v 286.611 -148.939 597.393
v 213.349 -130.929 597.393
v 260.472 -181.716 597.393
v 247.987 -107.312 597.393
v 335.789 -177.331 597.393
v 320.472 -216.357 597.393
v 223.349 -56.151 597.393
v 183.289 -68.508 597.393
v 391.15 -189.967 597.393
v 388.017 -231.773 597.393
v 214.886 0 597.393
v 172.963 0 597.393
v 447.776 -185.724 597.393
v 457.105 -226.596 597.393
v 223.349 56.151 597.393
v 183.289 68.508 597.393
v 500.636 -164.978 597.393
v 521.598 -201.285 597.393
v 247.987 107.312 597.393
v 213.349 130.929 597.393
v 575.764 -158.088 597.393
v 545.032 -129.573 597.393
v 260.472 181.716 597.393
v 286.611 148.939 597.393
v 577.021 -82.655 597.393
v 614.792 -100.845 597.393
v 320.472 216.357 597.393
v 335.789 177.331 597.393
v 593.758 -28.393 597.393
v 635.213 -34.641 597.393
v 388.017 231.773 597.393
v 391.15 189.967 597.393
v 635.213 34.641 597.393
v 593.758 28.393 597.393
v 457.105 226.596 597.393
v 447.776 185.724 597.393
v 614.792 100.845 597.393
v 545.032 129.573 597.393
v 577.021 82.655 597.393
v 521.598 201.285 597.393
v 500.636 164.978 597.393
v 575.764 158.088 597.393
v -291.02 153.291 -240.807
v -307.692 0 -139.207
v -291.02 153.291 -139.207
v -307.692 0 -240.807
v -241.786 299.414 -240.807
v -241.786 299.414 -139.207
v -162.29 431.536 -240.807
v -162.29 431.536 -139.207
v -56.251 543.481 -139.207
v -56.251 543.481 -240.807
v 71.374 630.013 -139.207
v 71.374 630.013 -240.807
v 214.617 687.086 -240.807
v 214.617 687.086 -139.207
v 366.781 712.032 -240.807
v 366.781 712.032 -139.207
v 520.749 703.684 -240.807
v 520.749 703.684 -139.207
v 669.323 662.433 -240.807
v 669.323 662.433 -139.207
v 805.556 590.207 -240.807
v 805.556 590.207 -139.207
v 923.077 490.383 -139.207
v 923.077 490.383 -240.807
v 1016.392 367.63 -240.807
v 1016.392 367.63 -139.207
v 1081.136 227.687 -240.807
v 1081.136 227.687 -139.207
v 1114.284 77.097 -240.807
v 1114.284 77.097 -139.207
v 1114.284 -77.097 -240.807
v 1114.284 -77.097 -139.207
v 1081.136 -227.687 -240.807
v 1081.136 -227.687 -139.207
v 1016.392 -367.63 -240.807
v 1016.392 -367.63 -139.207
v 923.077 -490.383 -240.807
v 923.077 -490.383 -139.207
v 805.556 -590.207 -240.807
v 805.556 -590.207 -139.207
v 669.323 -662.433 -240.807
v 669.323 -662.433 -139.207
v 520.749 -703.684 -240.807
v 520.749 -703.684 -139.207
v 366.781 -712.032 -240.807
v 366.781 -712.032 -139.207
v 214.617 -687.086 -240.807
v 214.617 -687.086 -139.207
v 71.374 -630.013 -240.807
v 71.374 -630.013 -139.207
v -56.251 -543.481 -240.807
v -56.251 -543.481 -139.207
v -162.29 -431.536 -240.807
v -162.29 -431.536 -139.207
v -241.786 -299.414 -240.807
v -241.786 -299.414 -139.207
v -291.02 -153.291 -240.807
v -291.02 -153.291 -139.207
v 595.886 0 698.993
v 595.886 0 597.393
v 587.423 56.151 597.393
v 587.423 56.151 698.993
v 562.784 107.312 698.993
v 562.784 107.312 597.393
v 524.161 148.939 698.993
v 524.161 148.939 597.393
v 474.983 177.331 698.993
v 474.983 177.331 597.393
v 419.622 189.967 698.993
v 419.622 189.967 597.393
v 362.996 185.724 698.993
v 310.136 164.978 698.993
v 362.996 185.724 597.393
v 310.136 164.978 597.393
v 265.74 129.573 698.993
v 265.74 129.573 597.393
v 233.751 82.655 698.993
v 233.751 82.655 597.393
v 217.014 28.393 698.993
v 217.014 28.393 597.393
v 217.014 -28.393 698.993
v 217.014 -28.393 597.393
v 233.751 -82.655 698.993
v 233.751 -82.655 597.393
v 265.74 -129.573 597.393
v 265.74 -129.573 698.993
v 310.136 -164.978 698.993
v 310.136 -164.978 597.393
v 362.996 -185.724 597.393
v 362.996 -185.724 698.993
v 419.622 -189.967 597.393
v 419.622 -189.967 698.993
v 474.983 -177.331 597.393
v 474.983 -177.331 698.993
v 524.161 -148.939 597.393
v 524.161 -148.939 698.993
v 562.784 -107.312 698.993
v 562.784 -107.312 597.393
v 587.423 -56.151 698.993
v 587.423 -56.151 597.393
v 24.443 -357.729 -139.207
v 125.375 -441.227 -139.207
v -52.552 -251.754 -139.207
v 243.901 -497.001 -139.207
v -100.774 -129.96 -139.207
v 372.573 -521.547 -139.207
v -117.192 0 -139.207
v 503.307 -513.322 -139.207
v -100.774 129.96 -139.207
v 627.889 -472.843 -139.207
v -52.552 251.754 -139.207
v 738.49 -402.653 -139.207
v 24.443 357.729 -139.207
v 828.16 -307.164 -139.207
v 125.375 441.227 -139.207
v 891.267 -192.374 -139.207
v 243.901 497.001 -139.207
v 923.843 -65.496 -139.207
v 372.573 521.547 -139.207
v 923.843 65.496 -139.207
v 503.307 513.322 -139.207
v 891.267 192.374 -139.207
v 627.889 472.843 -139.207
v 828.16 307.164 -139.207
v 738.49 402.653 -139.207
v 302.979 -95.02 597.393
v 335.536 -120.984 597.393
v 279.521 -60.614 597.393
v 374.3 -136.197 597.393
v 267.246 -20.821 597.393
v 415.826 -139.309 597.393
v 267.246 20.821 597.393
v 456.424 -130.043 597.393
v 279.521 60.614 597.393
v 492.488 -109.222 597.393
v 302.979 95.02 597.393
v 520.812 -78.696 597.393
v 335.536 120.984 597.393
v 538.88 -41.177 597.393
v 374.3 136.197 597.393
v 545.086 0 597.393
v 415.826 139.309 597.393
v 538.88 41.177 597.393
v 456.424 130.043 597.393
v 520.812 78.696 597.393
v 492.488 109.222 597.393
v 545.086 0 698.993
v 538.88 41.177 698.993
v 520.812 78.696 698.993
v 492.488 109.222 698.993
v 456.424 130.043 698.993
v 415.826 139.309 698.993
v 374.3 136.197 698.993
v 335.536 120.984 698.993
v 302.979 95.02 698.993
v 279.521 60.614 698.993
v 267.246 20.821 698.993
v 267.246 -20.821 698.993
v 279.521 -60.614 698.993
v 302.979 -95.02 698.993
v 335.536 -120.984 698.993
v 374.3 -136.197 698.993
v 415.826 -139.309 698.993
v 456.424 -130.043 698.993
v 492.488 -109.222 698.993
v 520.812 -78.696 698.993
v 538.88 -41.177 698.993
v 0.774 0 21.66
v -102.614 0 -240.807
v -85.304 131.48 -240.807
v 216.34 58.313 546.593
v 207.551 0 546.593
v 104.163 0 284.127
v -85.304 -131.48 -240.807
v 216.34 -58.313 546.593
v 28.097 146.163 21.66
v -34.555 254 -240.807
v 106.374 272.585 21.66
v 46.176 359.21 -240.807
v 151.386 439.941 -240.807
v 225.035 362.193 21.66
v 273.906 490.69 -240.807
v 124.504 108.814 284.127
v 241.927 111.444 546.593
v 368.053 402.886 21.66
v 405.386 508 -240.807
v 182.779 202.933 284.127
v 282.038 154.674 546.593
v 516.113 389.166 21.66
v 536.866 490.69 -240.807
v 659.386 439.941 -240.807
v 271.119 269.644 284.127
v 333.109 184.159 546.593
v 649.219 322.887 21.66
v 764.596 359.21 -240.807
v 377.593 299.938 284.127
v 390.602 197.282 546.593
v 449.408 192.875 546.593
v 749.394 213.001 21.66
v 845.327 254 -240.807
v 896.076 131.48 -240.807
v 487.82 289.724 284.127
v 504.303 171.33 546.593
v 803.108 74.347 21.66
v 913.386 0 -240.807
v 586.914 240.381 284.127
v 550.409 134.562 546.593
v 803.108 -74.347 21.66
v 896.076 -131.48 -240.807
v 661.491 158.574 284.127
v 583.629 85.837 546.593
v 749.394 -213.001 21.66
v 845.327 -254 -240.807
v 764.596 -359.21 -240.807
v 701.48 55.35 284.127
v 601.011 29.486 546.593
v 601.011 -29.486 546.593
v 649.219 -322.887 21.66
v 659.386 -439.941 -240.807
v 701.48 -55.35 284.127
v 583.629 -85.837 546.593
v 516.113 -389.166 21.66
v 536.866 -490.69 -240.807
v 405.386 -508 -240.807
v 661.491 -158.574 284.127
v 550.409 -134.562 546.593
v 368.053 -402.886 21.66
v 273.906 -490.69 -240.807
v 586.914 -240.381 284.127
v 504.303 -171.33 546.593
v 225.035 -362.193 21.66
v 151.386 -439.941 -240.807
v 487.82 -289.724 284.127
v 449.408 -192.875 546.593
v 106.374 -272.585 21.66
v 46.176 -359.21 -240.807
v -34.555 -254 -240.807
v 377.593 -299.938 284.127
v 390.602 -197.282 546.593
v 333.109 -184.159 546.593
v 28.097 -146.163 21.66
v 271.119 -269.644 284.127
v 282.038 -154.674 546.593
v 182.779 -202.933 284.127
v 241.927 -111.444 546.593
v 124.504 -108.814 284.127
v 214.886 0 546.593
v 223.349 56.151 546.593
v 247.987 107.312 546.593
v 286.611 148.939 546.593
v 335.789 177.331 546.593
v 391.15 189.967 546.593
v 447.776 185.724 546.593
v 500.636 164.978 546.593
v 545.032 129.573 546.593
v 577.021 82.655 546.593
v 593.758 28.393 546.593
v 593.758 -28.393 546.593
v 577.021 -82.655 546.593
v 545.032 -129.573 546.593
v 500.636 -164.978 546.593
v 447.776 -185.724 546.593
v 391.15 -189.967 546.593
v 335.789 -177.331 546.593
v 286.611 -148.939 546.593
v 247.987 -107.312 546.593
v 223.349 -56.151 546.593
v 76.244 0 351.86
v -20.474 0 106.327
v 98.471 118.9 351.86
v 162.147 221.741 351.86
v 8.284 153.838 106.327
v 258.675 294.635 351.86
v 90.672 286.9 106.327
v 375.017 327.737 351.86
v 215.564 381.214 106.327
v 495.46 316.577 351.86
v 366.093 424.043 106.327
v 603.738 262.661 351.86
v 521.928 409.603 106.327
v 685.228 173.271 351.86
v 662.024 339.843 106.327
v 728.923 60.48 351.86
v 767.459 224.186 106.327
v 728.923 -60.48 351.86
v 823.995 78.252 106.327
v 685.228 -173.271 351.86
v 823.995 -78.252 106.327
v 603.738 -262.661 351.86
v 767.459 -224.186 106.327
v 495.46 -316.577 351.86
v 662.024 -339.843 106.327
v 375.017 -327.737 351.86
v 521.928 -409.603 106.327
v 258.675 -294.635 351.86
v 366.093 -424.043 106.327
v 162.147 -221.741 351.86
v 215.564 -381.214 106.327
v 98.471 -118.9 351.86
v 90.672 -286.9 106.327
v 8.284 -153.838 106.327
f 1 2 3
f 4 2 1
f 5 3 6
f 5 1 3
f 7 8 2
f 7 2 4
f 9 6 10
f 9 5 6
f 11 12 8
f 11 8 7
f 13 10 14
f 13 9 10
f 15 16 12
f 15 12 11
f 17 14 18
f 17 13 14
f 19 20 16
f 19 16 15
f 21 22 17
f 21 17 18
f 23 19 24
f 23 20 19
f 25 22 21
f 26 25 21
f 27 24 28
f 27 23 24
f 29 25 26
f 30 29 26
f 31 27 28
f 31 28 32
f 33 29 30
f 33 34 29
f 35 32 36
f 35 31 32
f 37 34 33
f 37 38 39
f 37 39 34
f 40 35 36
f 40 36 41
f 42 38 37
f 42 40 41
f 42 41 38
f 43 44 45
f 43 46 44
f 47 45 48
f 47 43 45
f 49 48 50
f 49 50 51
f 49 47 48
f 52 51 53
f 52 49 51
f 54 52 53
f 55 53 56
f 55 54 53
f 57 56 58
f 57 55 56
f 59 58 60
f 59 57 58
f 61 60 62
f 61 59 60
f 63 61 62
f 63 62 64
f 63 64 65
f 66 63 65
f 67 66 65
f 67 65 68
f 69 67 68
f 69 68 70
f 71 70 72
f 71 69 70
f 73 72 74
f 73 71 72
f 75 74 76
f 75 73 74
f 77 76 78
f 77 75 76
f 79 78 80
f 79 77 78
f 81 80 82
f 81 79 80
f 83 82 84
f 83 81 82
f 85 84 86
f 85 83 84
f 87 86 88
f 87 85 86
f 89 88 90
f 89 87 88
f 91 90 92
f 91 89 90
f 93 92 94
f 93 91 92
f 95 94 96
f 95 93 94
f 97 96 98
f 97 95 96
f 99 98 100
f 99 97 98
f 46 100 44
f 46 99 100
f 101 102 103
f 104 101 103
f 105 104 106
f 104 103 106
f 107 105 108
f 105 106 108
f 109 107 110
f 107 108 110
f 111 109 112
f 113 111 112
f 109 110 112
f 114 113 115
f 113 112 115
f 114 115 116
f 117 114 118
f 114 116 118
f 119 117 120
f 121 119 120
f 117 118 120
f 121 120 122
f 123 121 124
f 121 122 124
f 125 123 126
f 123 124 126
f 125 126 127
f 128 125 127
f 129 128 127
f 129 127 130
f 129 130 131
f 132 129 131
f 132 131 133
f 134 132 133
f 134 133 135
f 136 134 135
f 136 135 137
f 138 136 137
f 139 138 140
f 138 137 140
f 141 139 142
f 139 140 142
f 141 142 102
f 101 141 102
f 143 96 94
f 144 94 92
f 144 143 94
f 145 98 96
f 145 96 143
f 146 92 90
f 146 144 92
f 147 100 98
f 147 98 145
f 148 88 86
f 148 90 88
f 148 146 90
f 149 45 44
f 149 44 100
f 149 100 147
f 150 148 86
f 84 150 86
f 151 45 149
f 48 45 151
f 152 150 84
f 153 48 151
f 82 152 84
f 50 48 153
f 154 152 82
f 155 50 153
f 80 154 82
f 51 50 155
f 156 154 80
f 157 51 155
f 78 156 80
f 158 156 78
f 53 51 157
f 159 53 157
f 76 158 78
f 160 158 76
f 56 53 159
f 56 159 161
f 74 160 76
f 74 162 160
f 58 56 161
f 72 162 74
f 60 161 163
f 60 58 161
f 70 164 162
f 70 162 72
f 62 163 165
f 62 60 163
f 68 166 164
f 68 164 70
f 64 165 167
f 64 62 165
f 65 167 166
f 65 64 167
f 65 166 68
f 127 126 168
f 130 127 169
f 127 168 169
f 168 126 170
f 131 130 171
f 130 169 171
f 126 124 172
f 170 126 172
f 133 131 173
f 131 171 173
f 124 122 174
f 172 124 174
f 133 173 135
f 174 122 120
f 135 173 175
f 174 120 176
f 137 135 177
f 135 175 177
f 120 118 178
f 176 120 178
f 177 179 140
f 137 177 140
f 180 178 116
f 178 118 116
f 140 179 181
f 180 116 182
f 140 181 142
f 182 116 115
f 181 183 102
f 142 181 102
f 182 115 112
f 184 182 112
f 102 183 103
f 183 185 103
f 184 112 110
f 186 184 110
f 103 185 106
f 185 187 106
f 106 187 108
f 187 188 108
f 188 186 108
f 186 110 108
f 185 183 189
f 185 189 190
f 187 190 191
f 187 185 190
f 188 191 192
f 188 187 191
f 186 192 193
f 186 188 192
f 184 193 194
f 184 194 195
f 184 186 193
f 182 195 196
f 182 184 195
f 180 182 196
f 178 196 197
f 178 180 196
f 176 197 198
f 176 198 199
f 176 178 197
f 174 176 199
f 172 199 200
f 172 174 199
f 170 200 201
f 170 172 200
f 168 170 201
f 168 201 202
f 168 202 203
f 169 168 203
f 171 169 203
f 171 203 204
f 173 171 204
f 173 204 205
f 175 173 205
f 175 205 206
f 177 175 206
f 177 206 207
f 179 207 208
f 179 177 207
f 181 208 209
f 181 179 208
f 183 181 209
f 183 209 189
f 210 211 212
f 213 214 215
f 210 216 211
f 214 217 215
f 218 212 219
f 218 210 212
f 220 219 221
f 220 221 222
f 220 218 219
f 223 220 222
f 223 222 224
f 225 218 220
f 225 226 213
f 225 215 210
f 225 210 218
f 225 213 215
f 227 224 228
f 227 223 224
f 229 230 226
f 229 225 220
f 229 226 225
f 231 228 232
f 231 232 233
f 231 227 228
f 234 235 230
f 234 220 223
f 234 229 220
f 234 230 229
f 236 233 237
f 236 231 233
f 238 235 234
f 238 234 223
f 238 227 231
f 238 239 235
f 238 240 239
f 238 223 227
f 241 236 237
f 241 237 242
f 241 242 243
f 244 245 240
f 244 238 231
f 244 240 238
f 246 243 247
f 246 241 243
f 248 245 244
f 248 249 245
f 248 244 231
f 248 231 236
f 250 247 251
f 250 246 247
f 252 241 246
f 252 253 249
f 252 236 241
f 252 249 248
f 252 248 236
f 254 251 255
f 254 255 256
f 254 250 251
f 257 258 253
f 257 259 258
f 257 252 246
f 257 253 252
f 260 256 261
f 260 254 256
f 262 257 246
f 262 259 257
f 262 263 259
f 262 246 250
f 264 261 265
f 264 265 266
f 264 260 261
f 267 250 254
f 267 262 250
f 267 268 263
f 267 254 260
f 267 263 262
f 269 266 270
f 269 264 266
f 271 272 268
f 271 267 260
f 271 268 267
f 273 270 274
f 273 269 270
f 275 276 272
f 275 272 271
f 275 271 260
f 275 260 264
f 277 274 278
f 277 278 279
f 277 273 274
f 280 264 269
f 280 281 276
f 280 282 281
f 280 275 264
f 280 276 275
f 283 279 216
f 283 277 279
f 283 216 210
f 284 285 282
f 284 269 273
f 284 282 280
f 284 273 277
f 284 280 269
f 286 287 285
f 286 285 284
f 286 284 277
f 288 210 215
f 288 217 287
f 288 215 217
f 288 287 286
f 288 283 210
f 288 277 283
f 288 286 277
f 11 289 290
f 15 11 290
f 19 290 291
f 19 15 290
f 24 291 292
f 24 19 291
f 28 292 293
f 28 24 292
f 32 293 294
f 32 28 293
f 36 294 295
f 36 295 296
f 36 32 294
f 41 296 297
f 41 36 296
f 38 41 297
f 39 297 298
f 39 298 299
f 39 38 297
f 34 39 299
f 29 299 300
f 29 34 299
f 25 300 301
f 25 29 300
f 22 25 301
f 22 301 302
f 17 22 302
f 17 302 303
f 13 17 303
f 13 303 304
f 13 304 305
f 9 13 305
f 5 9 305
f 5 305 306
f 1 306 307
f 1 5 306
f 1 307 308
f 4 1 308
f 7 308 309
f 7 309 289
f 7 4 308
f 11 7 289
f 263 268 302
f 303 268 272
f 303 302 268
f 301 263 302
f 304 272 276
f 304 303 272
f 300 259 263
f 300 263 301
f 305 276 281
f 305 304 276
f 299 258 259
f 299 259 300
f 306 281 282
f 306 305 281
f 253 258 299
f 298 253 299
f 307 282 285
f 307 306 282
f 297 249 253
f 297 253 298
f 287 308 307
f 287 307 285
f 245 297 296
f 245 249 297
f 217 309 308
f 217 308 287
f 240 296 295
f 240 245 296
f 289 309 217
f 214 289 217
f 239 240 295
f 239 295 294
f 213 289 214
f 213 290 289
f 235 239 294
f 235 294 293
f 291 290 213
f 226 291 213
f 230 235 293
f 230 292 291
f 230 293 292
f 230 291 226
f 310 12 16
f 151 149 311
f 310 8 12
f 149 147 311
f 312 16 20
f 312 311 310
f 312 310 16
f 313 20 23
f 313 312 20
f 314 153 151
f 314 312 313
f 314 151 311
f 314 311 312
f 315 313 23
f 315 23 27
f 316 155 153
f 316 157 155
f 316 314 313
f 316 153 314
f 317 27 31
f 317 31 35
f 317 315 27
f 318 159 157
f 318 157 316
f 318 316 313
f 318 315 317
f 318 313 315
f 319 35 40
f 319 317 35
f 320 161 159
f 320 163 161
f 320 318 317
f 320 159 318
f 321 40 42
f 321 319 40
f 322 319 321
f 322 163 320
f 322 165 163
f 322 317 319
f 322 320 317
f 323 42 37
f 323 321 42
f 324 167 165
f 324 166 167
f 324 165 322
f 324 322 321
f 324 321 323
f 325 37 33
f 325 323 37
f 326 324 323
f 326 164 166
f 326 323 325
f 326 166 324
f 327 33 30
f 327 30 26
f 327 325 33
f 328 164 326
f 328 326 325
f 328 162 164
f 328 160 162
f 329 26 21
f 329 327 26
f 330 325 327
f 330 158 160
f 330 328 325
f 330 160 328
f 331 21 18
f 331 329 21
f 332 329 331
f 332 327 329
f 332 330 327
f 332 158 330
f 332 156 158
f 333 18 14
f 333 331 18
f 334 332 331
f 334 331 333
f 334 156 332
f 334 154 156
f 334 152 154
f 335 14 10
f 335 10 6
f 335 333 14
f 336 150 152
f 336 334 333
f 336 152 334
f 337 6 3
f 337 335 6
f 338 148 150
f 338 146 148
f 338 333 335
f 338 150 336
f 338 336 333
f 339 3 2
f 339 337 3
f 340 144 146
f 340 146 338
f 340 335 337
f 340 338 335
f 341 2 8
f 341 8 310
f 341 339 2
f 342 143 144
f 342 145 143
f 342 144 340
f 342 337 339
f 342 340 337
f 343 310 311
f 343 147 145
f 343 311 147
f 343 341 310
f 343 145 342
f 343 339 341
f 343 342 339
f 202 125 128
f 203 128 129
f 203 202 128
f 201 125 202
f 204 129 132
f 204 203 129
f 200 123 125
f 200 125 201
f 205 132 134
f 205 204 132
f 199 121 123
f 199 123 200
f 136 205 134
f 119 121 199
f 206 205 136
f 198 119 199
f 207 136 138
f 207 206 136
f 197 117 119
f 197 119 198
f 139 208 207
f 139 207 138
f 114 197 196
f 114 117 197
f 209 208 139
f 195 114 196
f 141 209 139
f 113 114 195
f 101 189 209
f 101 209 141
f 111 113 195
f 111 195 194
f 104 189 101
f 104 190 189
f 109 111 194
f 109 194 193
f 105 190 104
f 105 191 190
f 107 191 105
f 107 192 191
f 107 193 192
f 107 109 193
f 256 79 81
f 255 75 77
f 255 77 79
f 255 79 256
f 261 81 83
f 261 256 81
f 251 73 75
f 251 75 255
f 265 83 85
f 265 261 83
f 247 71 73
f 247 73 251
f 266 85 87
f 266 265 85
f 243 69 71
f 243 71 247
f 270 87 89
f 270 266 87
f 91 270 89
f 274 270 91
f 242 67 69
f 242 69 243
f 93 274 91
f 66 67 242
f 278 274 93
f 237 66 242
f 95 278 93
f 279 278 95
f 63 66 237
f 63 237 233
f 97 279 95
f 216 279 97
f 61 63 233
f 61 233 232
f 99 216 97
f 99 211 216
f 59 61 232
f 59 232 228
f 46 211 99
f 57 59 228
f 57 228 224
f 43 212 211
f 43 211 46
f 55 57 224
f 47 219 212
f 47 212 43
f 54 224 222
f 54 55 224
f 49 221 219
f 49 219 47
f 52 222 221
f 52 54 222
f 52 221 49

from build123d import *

# Parameters (mm, degrees)
F2_R     = 190.5
F2_R_2   = 139.7
F3_DEPTH = 101.6


with BuildPart() as f1:
    # F0 (on Front) → F1 (revolve)
    with BuildSketch(Plane.XZ):
        Polygon((214.885982, 546.593298), (214.885982, 597.393298), (172.962602, 597.393298), (-117.191854, -139.206702), (-307.691854, -139.206702), (-307.691854, -240.806702), (-102.614018, -240.806702), (207.551091, 546.593298), align=None)
    revolve(axis=Axis((405.385982, 0, 135.375319), (0, 0, -1)))


with BuildPart() as f3:
    # F2 (on face) → F3 (new body)
    with BuildSketch(Plane.XY.offset(597.393298)):
        with Locations((405.385982, 0)):
            Circle(F2_R)
        with Locations((405.385982, 0)):
            Circle(F2_R_2, mode=Mode.SUBTRACT)
    extrude(amount=F3_DEPTH)


solid = Compound([f1.part, f3.part])
